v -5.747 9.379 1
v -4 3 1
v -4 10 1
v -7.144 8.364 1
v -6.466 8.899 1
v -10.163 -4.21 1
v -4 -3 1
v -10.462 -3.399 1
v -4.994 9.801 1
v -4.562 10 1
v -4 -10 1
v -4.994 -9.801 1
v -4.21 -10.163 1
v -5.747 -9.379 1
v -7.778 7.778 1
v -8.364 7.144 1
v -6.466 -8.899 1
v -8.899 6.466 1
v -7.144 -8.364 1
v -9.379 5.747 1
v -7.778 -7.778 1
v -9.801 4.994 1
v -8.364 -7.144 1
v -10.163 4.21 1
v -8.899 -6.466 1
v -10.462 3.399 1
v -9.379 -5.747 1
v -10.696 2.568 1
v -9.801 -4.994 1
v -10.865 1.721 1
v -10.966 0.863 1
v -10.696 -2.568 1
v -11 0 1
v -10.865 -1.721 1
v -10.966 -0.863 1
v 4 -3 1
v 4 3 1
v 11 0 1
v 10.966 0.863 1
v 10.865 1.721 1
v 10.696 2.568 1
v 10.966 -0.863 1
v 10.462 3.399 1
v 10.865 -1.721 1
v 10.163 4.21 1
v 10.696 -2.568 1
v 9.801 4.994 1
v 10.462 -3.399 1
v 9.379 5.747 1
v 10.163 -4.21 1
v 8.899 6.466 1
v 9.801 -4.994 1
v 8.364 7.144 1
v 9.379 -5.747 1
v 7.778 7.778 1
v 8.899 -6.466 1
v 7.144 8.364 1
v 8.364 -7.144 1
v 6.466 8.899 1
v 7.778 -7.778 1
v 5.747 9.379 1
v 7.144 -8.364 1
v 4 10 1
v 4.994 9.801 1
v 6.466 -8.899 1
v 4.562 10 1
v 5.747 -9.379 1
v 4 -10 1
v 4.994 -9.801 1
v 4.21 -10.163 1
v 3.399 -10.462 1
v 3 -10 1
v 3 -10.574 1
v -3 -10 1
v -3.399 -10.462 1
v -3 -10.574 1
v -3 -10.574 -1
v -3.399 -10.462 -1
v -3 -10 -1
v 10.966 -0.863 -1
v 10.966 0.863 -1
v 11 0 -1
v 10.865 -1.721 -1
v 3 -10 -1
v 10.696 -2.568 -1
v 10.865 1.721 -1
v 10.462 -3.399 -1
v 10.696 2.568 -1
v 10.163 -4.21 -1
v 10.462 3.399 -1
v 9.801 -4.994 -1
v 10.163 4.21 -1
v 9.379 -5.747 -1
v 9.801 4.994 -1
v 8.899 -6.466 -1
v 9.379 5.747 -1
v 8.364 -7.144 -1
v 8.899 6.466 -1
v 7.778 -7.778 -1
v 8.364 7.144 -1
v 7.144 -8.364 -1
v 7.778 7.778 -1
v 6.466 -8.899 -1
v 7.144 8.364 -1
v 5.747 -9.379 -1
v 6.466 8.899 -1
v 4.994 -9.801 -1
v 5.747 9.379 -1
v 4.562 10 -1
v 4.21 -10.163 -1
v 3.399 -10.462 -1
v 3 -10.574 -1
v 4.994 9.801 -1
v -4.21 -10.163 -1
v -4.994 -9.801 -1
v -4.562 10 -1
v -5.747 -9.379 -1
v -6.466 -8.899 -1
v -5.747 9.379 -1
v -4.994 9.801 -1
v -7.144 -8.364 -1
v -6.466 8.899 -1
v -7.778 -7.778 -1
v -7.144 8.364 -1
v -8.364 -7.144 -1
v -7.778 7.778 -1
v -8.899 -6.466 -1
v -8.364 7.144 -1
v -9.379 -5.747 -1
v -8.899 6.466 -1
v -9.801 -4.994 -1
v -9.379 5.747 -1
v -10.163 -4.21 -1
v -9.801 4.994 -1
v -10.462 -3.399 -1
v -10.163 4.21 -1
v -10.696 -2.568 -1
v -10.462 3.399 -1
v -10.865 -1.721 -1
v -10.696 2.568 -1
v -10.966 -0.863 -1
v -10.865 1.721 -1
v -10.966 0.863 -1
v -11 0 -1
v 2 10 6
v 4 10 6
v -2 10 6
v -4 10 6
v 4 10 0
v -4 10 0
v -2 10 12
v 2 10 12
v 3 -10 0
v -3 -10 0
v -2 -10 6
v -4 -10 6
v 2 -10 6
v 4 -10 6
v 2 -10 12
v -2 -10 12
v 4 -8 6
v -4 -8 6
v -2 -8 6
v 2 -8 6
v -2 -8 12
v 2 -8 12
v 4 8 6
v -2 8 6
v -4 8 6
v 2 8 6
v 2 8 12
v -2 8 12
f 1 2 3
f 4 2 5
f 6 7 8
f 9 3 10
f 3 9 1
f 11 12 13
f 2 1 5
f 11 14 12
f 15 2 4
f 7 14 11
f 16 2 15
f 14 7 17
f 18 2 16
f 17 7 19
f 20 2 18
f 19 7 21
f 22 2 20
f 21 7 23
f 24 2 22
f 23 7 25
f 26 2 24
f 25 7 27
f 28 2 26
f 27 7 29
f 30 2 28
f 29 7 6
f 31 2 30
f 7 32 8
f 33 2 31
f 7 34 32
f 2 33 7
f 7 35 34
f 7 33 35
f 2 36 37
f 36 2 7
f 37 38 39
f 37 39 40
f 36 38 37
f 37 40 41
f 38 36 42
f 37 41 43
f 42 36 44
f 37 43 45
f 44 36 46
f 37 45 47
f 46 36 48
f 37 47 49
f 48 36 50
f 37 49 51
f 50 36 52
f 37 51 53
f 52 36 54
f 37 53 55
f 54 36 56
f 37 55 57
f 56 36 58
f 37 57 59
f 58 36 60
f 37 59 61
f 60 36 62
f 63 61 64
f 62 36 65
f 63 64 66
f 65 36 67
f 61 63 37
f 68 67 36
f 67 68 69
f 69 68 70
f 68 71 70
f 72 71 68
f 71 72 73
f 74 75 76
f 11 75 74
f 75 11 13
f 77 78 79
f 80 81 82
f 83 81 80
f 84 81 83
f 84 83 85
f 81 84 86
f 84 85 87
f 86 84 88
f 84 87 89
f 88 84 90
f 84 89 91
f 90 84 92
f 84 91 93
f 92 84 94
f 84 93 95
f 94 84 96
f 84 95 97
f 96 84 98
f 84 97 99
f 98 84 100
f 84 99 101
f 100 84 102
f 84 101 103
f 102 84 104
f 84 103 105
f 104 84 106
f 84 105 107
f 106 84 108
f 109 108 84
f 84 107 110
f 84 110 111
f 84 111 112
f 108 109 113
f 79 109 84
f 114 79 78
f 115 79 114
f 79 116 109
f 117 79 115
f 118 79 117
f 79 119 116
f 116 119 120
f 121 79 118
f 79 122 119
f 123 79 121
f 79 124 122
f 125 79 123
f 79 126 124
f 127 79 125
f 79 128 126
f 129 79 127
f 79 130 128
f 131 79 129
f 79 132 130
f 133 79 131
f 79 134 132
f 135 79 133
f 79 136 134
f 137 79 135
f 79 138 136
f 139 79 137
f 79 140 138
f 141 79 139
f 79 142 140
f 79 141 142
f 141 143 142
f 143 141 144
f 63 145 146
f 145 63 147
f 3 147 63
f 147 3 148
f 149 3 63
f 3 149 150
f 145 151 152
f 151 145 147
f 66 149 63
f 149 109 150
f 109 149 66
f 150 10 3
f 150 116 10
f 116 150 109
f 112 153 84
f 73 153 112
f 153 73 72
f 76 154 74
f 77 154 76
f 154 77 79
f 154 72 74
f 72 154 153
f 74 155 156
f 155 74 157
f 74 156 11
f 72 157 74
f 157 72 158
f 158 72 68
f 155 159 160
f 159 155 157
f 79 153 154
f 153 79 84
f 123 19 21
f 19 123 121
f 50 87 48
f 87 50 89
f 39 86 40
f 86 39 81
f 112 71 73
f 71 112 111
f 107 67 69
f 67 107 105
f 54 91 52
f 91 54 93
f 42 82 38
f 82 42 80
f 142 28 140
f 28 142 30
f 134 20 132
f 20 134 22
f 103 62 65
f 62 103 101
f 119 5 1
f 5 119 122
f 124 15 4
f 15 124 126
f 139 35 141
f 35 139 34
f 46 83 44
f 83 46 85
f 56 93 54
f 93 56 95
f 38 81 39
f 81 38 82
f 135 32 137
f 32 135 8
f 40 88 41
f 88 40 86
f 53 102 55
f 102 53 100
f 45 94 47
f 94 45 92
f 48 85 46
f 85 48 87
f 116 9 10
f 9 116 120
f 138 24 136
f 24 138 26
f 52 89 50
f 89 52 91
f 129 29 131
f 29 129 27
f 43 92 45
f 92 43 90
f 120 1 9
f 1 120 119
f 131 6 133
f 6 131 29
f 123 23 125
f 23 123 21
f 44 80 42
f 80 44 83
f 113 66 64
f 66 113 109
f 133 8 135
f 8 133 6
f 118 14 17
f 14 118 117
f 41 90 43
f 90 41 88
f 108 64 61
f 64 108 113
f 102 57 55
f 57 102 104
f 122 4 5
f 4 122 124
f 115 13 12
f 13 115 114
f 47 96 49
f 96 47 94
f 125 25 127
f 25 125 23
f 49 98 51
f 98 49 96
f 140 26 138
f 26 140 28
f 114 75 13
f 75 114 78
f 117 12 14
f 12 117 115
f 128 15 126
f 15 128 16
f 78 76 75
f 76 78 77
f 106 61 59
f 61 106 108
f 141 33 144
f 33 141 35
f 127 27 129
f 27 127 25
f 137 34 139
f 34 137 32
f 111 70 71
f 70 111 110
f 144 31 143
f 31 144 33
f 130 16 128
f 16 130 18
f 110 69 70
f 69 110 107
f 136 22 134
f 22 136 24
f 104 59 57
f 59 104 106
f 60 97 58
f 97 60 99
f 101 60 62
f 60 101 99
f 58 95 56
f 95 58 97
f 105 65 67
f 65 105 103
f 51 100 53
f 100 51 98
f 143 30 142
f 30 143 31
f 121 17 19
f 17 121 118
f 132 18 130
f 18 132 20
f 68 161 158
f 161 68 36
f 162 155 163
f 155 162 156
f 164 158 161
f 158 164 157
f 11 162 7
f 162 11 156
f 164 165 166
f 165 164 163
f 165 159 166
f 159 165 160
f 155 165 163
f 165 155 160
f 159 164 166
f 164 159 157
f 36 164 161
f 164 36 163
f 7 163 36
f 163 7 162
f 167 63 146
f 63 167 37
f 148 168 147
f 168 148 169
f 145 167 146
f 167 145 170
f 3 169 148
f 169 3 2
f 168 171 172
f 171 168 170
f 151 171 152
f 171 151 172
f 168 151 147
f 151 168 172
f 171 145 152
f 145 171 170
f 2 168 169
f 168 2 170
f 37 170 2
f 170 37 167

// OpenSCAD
// krytka šroubu pod klikou na přednich dveřích Chrysler 300C

$fn=80;
module wedge(x,y,z){
    linear_extrude(z, center=true) polygon(points=[[0,0],[x,0],[x,y]]);
    
    }//module

module small_hook(){
    color("Green") cube([5,2,5],center=true);
    color("Green") translate([0,1,2]) rotate([0,+90,0]) wedge(5,5,5);
    }//module

module big_hook(){
    union(){
    color("Green") cube([8,2,6],center=true);
    color("Green") translate([-1,0,6]) cube([2,2,6],center=true);
    color("Green") translate([+1,0,6]) cube([2,2,6],center=true);
    color("Green") translate([0,-1,3]) rotate([0,+90,180]) wedge(7,7,8);    
        }//union
    }//module

module base(){
    
    difference(){
        color("Blue") cylinder(h=2, d=22, center=true);
        union(){
            color("Red")translate([0,11,0]) cube([10,2,2],center=true);
            color("Red")translate([0,-11,0]) cube([6,2,2],center=true);
            }//union
        }//difference
    }//module
    
module part(){
    translate([0,0,0]) base();
    //translate([0,-9,3]) mirror([0,0,0]) small_hook();
    translate([0,-9,3]) mirror([0,1,-0]) big_hook();
    translate([0,+9,3]) mirror([0,0,0]) big_hook();
    
    }//module
    
    part();
    //wedge(5,5,5);
